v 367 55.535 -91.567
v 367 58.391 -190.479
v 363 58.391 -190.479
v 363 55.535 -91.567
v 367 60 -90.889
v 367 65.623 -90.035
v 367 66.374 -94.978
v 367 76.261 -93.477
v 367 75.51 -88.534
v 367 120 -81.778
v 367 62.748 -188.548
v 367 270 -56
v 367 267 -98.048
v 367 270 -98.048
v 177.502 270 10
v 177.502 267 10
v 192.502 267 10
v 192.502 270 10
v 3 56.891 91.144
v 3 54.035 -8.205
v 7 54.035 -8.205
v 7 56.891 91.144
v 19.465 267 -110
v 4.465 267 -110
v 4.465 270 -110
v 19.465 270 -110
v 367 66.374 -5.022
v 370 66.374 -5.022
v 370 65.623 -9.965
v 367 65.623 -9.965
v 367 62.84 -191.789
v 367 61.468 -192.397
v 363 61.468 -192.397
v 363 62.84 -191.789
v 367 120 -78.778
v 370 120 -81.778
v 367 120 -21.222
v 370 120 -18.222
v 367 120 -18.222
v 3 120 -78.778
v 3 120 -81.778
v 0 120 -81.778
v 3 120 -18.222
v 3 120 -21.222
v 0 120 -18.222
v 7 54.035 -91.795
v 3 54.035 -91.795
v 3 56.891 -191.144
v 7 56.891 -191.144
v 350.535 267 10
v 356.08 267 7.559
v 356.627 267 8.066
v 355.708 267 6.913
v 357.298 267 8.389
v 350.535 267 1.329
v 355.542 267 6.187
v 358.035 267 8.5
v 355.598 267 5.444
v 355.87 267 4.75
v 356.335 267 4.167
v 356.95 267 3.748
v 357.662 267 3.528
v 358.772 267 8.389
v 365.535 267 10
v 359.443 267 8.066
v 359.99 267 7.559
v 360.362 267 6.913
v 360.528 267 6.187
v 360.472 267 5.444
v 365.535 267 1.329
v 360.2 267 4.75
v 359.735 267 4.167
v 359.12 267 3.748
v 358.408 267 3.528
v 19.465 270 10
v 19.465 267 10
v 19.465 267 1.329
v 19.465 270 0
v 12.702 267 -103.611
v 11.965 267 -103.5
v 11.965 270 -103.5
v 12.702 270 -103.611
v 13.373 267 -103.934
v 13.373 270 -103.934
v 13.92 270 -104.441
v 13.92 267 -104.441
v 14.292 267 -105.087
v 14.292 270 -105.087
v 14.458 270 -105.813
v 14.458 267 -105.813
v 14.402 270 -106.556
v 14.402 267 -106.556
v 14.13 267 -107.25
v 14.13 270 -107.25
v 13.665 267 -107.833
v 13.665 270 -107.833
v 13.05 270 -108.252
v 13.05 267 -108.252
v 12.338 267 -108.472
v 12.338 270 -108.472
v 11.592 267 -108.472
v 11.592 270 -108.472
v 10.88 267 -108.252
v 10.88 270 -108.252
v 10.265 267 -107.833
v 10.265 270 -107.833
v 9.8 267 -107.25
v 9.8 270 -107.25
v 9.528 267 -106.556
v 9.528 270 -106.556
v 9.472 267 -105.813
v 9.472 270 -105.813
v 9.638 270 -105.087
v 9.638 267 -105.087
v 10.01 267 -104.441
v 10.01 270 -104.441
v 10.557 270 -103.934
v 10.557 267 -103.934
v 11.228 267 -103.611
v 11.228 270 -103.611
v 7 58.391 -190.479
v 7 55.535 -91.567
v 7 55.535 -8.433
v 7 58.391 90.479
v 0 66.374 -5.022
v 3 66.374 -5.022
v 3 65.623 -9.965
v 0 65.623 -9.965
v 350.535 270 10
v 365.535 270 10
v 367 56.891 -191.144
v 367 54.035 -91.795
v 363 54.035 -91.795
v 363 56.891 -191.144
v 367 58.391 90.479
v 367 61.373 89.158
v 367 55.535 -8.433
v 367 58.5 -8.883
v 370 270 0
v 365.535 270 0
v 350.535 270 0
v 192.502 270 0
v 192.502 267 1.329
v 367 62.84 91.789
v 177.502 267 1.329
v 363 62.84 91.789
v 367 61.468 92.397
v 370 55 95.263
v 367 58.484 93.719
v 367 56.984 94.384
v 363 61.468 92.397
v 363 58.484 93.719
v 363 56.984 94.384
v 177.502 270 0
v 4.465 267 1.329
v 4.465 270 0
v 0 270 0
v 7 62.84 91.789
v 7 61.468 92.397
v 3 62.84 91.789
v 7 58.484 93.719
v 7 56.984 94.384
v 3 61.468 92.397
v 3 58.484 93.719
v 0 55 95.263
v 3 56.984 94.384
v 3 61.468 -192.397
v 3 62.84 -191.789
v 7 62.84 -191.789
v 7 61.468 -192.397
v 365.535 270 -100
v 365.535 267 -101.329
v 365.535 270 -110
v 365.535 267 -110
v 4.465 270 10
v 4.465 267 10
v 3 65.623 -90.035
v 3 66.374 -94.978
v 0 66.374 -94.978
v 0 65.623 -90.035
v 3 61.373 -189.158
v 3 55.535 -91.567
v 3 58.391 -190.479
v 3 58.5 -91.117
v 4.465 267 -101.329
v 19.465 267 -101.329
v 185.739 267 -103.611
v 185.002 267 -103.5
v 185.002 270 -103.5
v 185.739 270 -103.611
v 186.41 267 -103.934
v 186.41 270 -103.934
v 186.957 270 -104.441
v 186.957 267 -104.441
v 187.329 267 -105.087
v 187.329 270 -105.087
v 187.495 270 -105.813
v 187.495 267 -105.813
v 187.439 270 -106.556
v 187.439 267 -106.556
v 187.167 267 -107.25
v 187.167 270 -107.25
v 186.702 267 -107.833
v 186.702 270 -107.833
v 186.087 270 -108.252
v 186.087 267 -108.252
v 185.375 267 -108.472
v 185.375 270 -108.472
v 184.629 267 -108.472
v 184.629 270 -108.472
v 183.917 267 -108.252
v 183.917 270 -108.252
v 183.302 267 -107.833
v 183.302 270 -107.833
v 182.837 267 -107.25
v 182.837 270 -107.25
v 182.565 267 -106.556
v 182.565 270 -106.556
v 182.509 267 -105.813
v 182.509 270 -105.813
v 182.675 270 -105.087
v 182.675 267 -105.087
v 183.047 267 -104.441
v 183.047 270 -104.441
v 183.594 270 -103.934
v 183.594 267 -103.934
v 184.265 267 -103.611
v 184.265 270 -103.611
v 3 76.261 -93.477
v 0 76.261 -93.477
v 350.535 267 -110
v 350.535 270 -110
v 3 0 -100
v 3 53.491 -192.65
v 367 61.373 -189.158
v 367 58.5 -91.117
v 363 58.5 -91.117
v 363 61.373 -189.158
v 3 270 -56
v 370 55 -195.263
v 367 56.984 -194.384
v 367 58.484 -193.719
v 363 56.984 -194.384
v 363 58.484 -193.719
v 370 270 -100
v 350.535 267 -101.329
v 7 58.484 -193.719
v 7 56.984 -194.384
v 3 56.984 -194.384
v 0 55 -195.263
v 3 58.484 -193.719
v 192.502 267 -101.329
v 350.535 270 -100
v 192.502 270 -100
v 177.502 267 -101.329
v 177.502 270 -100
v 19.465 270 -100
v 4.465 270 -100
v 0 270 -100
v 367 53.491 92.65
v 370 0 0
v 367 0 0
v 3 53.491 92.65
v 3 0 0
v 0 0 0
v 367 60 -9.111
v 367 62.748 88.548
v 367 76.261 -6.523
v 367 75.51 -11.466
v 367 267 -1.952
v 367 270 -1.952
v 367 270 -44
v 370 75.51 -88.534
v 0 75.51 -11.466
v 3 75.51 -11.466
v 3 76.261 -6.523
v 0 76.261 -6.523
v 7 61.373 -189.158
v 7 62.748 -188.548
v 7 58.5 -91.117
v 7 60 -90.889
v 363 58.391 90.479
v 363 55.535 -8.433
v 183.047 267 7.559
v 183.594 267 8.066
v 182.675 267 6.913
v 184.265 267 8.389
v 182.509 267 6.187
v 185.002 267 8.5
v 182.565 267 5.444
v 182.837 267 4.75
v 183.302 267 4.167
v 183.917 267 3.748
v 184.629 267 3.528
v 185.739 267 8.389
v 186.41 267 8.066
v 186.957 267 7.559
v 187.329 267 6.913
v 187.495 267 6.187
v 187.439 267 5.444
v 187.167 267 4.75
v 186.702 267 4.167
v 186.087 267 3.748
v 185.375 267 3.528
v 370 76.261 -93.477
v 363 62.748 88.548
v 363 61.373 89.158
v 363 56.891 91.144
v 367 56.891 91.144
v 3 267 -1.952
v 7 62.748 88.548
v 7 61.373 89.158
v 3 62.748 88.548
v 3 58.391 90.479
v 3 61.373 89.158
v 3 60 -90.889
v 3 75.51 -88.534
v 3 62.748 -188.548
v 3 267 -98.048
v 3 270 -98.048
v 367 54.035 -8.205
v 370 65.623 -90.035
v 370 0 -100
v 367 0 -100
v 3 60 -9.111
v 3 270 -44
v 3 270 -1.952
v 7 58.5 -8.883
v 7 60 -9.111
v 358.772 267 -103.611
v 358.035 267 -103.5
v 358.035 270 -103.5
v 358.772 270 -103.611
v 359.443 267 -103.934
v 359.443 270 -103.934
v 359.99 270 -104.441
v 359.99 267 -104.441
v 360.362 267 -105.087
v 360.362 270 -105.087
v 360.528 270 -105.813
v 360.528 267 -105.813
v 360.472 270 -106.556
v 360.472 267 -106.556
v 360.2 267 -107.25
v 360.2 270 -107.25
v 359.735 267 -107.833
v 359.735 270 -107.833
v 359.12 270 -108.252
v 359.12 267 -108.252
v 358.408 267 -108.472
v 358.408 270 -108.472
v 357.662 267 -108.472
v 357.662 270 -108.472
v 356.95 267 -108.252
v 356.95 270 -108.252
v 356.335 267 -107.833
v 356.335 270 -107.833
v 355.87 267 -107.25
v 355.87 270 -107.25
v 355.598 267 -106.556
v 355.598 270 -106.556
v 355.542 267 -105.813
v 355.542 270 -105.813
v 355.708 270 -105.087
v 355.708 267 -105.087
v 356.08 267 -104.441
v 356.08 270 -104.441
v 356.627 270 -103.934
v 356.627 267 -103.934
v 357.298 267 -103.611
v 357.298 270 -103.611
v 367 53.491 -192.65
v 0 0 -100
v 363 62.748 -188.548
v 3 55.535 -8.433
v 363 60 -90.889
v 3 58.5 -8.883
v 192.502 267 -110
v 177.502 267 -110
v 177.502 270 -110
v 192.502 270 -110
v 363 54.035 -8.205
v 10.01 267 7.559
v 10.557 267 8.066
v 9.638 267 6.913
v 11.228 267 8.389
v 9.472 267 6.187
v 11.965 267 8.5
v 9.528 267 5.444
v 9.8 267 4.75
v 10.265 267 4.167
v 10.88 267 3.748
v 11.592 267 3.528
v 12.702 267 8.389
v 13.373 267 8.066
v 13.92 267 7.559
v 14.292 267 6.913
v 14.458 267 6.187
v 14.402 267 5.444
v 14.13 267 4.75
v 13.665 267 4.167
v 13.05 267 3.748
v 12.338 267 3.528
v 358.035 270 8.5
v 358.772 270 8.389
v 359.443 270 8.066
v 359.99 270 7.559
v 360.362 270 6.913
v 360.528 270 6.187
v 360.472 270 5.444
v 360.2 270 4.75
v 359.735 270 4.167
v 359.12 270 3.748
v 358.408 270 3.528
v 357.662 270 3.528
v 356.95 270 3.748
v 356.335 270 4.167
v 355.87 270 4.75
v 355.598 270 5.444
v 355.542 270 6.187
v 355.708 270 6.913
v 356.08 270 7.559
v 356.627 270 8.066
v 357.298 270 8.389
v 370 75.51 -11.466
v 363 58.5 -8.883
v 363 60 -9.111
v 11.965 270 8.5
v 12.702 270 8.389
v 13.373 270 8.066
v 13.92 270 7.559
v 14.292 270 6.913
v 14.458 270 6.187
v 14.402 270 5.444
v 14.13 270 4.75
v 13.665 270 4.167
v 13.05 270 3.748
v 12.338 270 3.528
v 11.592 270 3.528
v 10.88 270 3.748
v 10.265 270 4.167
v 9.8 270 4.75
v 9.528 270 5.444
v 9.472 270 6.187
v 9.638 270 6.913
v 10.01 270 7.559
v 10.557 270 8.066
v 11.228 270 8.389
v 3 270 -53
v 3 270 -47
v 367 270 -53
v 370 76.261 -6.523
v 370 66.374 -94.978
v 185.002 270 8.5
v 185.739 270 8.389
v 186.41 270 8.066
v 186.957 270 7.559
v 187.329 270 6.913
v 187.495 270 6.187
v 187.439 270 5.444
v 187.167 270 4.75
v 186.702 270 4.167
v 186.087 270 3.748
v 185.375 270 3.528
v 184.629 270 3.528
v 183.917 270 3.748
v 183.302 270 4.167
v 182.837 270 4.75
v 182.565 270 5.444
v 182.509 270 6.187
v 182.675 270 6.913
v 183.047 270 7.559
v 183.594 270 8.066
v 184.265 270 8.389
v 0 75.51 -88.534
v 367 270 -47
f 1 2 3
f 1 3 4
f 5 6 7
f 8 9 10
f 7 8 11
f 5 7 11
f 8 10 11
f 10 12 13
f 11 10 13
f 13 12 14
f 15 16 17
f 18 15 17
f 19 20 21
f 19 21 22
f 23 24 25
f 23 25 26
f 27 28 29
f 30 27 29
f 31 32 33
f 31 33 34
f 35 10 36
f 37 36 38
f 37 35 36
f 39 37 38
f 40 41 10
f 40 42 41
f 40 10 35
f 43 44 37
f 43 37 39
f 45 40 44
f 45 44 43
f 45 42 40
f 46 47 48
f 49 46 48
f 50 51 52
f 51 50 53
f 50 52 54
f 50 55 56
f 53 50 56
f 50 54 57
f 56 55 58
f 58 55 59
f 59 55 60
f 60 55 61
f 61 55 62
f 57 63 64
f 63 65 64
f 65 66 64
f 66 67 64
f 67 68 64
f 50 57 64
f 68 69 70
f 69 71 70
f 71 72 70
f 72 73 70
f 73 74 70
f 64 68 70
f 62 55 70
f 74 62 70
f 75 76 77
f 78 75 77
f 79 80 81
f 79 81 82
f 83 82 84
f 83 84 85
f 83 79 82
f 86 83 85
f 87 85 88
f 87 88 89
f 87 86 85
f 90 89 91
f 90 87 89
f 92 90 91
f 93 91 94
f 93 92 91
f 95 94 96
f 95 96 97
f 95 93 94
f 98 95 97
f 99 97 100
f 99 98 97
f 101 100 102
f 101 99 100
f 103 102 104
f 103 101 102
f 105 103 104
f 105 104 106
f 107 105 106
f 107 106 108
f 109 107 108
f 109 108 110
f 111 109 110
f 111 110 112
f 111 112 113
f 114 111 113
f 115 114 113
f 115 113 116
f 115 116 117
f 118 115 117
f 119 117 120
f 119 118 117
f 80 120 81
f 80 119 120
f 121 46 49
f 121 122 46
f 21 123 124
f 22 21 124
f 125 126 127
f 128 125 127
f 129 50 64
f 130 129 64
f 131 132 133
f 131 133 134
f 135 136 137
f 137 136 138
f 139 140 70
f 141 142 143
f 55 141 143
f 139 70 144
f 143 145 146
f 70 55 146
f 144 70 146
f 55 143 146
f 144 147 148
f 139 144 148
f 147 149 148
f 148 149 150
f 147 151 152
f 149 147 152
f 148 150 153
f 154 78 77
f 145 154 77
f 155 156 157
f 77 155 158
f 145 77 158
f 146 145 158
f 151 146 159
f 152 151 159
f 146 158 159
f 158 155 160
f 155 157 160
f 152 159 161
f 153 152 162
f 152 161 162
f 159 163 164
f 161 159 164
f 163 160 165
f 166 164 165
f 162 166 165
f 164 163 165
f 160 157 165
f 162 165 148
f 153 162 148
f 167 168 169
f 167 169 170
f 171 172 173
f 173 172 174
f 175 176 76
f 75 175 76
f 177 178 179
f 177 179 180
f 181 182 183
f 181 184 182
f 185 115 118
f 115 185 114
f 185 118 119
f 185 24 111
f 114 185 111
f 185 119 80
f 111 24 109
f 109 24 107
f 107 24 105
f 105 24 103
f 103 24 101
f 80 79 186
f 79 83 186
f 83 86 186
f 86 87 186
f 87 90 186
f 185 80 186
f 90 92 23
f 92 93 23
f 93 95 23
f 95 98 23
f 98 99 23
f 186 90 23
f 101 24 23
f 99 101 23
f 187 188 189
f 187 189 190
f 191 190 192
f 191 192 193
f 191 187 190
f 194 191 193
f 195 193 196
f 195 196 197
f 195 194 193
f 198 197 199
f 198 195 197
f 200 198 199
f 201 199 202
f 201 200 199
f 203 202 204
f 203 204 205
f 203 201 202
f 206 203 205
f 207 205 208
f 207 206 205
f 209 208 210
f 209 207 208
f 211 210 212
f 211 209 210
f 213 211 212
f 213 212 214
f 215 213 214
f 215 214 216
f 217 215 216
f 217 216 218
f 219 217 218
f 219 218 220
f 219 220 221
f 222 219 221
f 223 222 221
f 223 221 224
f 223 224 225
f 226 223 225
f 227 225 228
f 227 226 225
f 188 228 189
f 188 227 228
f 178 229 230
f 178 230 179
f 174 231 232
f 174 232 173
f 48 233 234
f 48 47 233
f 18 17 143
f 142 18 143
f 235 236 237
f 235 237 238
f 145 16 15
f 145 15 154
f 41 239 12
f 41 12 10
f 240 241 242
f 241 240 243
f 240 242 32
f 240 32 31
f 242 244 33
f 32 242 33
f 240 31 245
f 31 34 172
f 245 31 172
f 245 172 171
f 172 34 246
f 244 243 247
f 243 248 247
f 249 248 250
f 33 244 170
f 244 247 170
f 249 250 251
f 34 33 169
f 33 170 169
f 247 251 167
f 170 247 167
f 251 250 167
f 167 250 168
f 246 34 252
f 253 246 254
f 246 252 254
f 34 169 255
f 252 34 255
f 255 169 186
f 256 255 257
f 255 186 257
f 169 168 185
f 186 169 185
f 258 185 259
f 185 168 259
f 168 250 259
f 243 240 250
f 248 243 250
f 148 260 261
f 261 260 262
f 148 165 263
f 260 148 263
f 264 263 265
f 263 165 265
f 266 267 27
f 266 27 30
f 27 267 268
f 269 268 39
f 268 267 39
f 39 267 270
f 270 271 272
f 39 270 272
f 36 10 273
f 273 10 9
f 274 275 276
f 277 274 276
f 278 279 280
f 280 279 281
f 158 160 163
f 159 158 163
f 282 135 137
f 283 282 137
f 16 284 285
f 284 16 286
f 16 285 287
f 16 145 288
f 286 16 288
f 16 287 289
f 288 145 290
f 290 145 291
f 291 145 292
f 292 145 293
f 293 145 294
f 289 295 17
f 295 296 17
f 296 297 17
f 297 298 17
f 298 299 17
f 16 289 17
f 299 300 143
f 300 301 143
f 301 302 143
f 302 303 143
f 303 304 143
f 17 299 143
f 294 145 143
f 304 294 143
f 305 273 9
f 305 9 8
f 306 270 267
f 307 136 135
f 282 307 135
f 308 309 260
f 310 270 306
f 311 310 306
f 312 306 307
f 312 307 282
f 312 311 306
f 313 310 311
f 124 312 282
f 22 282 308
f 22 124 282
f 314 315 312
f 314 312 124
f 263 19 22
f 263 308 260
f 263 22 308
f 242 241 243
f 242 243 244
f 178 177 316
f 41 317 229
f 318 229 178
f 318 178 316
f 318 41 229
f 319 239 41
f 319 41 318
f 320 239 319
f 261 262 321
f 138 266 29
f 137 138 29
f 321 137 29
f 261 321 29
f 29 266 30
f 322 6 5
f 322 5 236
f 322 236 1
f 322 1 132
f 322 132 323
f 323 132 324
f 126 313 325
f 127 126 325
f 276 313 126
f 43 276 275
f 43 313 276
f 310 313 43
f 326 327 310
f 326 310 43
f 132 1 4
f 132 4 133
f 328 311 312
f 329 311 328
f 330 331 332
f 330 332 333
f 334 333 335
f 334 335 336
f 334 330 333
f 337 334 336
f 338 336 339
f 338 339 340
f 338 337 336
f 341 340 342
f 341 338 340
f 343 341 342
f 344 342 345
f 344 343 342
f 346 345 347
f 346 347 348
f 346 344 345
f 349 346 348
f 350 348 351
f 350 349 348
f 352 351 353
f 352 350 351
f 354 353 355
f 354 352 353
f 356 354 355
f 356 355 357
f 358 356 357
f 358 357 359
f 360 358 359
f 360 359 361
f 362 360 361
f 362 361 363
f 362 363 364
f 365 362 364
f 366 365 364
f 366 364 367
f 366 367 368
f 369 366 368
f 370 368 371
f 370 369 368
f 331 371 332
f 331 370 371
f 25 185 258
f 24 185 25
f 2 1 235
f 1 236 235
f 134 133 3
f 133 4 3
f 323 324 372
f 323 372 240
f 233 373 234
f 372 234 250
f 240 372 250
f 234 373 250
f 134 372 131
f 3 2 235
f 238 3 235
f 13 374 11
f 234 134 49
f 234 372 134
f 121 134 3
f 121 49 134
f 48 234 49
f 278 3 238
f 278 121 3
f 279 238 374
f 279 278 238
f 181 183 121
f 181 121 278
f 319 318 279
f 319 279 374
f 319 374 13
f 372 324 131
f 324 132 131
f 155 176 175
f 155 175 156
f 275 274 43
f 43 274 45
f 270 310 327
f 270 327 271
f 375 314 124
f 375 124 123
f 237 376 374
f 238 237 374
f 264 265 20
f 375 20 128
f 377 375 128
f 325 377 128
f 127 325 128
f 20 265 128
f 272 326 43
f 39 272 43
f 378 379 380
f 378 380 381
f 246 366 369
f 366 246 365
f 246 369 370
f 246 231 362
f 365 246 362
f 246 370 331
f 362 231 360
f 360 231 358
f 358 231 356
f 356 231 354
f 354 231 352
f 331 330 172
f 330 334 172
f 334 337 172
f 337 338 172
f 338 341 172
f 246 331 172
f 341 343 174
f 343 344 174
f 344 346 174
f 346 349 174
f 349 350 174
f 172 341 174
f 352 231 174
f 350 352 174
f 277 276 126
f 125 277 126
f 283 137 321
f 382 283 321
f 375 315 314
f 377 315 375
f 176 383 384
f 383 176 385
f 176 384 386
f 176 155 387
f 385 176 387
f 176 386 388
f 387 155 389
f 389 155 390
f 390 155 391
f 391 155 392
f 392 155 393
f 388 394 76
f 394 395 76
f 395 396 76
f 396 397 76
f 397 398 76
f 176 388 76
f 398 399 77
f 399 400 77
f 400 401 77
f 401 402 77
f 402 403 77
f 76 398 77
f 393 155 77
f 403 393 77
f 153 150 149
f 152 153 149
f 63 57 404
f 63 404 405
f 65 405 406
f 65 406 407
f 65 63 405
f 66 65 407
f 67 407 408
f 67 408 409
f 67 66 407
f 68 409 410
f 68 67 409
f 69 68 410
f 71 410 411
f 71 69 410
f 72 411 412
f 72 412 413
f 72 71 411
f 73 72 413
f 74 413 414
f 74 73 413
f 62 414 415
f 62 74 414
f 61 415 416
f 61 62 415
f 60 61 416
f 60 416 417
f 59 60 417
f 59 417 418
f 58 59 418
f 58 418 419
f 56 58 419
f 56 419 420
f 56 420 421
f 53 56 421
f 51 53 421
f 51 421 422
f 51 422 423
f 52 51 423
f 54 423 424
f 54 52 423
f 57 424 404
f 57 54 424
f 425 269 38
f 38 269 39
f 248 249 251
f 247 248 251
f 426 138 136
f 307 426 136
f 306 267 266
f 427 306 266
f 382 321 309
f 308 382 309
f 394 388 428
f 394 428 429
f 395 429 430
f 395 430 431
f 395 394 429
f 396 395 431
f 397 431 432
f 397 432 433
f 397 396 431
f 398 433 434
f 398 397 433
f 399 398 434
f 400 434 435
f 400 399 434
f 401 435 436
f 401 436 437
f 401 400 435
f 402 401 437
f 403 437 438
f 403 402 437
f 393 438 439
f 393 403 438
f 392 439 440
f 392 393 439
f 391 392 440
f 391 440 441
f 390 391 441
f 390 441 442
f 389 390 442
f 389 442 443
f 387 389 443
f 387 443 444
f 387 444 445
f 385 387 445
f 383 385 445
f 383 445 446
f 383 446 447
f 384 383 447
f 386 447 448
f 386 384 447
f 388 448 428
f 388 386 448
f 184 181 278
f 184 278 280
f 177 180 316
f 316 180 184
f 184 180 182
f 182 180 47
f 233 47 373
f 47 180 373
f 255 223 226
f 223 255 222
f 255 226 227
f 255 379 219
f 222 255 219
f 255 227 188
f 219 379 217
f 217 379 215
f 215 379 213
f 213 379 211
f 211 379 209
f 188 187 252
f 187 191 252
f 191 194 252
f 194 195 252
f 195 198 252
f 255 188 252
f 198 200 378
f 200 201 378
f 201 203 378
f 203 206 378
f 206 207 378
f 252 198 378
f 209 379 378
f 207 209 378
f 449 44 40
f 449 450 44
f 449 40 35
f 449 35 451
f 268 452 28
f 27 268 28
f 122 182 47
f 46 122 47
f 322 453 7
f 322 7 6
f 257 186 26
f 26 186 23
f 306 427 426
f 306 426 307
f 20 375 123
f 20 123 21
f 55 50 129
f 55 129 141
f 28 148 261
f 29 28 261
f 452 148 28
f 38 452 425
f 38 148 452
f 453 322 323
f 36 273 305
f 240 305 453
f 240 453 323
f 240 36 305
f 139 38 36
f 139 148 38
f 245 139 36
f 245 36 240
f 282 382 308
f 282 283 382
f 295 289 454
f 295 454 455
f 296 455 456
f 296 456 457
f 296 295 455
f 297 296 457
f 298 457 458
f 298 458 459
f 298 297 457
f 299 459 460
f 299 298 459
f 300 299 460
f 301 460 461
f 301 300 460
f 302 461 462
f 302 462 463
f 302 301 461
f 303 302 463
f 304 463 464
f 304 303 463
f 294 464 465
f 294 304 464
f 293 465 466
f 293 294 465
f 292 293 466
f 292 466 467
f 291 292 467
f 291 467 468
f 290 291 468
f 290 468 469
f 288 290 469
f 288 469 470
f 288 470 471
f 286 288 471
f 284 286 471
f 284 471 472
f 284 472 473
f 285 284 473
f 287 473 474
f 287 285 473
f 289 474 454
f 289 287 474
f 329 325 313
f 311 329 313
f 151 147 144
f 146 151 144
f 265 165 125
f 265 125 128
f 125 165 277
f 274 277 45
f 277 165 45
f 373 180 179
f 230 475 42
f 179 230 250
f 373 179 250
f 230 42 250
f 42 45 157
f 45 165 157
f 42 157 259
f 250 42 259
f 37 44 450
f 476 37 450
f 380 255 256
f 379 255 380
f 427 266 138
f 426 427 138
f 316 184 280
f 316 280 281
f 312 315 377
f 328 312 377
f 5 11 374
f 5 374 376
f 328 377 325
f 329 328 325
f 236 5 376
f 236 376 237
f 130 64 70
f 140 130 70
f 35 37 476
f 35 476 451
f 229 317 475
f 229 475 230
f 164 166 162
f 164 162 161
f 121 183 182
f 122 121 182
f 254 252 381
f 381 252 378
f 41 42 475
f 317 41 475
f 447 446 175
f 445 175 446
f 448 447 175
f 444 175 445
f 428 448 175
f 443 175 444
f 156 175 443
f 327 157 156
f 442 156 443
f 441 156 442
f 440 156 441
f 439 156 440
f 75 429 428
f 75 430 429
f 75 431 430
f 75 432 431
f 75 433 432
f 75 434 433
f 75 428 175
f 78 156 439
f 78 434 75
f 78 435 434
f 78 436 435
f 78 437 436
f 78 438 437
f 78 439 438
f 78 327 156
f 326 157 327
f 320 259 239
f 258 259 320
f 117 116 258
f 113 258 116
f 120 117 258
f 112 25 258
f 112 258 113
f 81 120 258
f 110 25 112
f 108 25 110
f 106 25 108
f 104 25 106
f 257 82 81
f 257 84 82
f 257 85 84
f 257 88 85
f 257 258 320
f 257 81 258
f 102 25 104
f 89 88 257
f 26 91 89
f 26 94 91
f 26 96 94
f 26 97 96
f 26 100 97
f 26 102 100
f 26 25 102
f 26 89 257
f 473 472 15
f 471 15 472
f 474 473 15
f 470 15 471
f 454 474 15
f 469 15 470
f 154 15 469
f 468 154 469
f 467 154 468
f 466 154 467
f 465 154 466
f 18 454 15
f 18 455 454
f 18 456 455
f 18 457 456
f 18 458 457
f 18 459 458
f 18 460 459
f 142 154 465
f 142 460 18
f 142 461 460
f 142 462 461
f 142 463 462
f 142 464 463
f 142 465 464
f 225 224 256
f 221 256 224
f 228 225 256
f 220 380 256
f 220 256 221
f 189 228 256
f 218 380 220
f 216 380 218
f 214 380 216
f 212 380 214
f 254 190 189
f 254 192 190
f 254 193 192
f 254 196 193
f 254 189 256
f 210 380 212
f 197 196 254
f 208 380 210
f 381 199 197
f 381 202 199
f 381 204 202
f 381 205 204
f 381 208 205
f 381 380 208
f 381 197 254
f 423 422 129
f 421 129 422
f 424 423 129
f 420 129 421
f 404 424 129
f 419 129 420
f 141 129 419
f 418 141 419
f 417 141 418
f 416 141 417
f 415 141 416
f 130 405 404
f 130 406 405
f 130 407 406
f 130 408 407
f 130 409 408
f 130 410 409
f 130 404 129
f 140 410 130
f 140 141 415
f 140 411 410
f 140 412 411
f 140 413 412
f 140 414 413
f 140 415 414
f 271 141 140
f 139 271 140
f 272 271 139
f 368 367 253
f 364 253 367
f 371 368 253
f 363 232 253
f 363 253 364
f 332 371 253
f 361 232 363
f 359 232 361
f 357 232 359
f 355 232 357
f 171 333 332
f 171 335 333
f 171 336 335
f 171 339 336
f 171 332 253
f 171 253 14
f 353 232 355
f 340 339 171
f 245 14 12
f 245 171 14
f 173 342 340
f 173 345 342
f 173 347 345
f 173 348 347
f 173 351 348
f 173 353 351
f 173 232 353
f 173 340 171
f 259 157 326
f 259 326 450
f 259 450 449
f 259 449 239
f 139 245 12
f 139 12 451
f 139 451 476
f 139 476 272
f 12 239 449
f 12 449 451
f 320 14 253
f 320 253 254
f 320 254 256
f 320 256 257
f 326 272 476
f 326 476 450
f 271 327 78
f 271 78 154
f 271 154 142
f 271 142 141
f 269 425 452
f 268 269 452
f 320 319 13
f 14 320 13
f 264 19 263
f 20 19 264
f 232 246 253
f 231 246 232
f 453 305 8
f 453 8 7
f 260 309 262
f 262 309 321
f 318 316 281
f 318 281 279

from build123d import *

# Parameters (mm, degrees)
BOSS_EXTRUDE1_DEPTH = 370
SHELL1_T            = -3
SKETCH4_W           = 364
SKETCH4_H           = 96.095905324
CUT_EXTRUDE2_DEPTH  = 497.302890263
BOSS_EXTRUDE2_REACH = 497.698
SKETCH9_W           = 15
SKETCH9_H           = 10
SKETCH9_R           = 2.5
BOSS_EXTRUDE4_DEPTH = 3
BOSS_EXTRUDE5_DEPTH = 4
BOSS_EXTRUDE6_DEPTH = 4
CUT_EXTRUDE3_DEPTH  = 498.923245976


with BuildPart() as part:
    # Sketch2 → Boss-Extrude1 (new body)
    with BuildSketch(Plane(origin=(0, 0, 0), x_dir=(0, 0, -1), z_dir=(1, 0, 0))):
        Polygon((100, 0), (195.262794416, 55), (100, 270), (0, 270), (-95.262794416, 55), (0, 0), (18.222222222, 120), (81.777777778, 120), align=None)
    extrude(amount=BOSS_EXTRUDE1_DEPTH)

    # Shell1
    shell1_openings = [part.faces().sort_by_distance(p)[0] for p in [
        (185, 27.5, 47.631397208),
        (185, 27.5, -147.631397208),
        (185, 60, -90.888888889),
        (185, 120, -50),
        (185, 60, -9.111111111),
    ]]
    offset(amount=SHELL1_T, openings=shell1_openings, kind=Kind.INTERSECTION)

    # Sketch4 → Cut-Extrude2 (cut, through all)
    with BuildSketch(Plane.XZ.offset(-267)):
        with Locations((185, -50)):
            Rectangle(SKETCH4_W, SKETCH4_H)
    extrude(amount=-CUT_EXTRUDE2_DEPTH, mode=Mode.SUBTRACT)

    # Sketch5 → Boss-Extrude2 (add, up to next)
    with BuildSketch(Plane(origin=(3, 0, 0), x_dir=(0, 0, -1), z_dir=(1, 0, 0)), mode=Mode.PRIVATE) as boss_extrude2_sk1:
        Polygon((47, 270), (44, 270), (18.222222222, 120), (21.222222222, 120), align=None)
    boss_extrude2_tool1 = extrude(boss_extrude2_sk1.sketch, amount=BOSS_EXTRUDE2_REACH, mode=Mode.PRIVATE) - part.part
    # Sketch5 → Boss-Extrude2 (add, up to next)
    with BuildSketch(Plane(origin=(3, 0, 0), x_dir=(0, 0, -1), z_dir=(1, 0, 0)), mode=Mode.PRIVATE) as boss_extrude2_sk2:
        Polygon((53, 270), (56, 270), (81.777777778, 120), (78.777777778, 120), align=None)
    boss_extrude2_tool2 = extrude(boss_extrude2_sk2.sketch, amount=BOSS_EXTRUDE2_REACH, mode=Mode.PRIVATE) - part.part
    add(boss_extrude2_tool1.solids().sort_by_distance((3, 195, -32.611111))[0])
    add(boss_extrude2_tool2.solids().sort_by_distance((3, 195, -67.388889))[0])

    # Sketch9 → Boss-Extrude4 (add)
    # profile 1 of 6: a face of its own
    with BuildSketch(Plane(origin=(0, 267, 0), x_dir=(1, 0, 0), z_dir=(0, 1, 0))):
        with Locations((11.965, 105)):
            Rectangle(SKETCH9_W, SKETCH9_H)
        with Locations(Location((11.965, 106, 0), (0, 0, 270))):
            Circle(SKETCH9_R, mode=Mode.SUBTRACT)
    # profile 2 of 6: a face of its own
    with BuildSketch(Plane(origin=(0, 267, 0), x_dir=(1, 0, 0), z_dir=(0, 1, 0))):
        with Locations((185.002, 105)):
            Rectangle(SKETCH9_W, SKETCH9_H)
        with Locations(Location((185.002, 106, 0), (0, 0, 270))):
            Circle(SKETCH9_R, mode=Mode.SUBTRACT)
    # profile 3 of 6: a face of its own
    with BuildSketch(Plane(origin=(0, 267, 0), x_dir=(1, 0, 0), z_dir=(0, 1, 0))):
        with Locations((358.035, 105)):
            Rectangle(SKETCH9_W, SKETCH9_H)
        with Locations(Location((358.035, 106, 0), (0, 0, 270))):
            Circle(SKETCH9_R, mode=Mode.SUBTRACT)
    # profile 4 of 6: a face of its own
    with BuildSketch(Plane(origin=(0, 267, 0), x_dir=(1, 0, 0), z_dir=(0, 1, 0))):
        with Locations((358.035, -5)):
            Rectangle(SKETCH9_W, SKETCH9_H)
        with Locations(Location((358.035, -6, 0), (0, 0, 270))):
            Circle(SKETCH9_R, mode=Mode.SUBTRACT)
    # profile 5 of 6: a face of its own
    with BuildSketch(Plane(origin=(0, 267, 0), x_dir=(1, 0, 0), z_dir=(0, 1, 0))):
        with Locations((185.002, -5)):
            Rectangle(SKETCH9_W, SKETCH9_H)
        with Locations(Location((185.002, -6, 0), (0, 0, 270))):
            Circle(SKETCH9_R, mode=Mode.SUBTRACT)
    # profile 6 of 6: a face of its own
    with BuildSketch(Plane(origin=(0, 267, 0), x_dir=(1, 0, 0), z_dir=(0, 1, 0))):
        with Locations((11.965, -5)):
            Rectangle(SKETCH9_W, SKETCH9_H)
        with Locations(Location((11.965, -6, 0), (0, 0, 270))):
            Circle(SKETCH9_R, mode=Mode.SUBTRACT)
    extrude(amount=BOSS_EXTRUDE4_DEPTH)

    # Sketch11 → Boss-Extrude5 (add)
    with BuildSketch(Plane.ZY.offset(-367)):
        Polygon((-9.111111111, 60), (-8.883333333, 58.5), (92.396882217, 61.468119339), (91.789234305, 62.839528838), align=None)
        Polygon((94.383691773, 56.984059669), (93.719067626, 58.484059669), (-8.433126527, 55.535223468), (-8.205348749, 54.035223468), align=None)
        Polygon((-191.789234305, 62.839528838), (-90.888888889, 60), (-91.116666667, 58.5), (-192.396882217, 61.468119339), align=None)
        Polygon((-194.383691773, 56.984059669), (-193.719067625, 58.484059669), (-91.566873473, 55.535223468), (-91.794651251, 54.035223468), align=None)
    extrude(amount=BOSS_EXTRUDE5_DEPTH)

    # Sketch10 → Boss-Extrude6 (add)
    with BuildSketch(Plane(origin=(3, 0, 0), x_dir=(0, 0, -1), z_dir=(1, 0, 0))):
        Polygon((9.111111111, 60), (-91.789234305, 62.839528838), (-92.396882217, 61.468119339), (8.883333333, 58.5), align=None)
        Polygon((-93.719067626, 58.484059669), (8.433126527, 55.535223468), (8.205348749, 54.035223468), (-94.383691773, 56.984059669), align=None)
        Polygon((194.383691773, 56.984059669), (193.719067625, 58.484059669), (91.566873473, 55.535223468), (91.794651251, 54.035223468), align=None)
        Polygon((192.396882217, 61.468119339), (91.116666667, 58.5), (90.888888889, 60), (191.789234305, 62.839528838), align=None)
    extrude(amount=BOSS_EXTRUDE6_DEPTH)

    # Sketch12 → Cut-Extrude3 (cut, through all)
    with BuildSketch(Plane(origin=(370, 0, 0), x_dir=(0, 0, -1), z_dir=(1, 0, 0))):
        Polygon((11.466336894, 75.51002345), (6.523006166, 76.260677375), (5.021698316, 66.37401592), (9.965029044, 65.623361994), (10.715682969, 70.566692722), align=None)
        Polygon((89.284317031, 70.566692722), (88.533663106, 75.51002345), (93.476993834, 76.260677375), (94.978301684, 66.37401592), (90.034970956, 65.623361994), align=None)
    extrude(amount=-CUT_EXTRUDE3_DEPTH, mode=Mode.SUBTRACT)


solid = part.part
